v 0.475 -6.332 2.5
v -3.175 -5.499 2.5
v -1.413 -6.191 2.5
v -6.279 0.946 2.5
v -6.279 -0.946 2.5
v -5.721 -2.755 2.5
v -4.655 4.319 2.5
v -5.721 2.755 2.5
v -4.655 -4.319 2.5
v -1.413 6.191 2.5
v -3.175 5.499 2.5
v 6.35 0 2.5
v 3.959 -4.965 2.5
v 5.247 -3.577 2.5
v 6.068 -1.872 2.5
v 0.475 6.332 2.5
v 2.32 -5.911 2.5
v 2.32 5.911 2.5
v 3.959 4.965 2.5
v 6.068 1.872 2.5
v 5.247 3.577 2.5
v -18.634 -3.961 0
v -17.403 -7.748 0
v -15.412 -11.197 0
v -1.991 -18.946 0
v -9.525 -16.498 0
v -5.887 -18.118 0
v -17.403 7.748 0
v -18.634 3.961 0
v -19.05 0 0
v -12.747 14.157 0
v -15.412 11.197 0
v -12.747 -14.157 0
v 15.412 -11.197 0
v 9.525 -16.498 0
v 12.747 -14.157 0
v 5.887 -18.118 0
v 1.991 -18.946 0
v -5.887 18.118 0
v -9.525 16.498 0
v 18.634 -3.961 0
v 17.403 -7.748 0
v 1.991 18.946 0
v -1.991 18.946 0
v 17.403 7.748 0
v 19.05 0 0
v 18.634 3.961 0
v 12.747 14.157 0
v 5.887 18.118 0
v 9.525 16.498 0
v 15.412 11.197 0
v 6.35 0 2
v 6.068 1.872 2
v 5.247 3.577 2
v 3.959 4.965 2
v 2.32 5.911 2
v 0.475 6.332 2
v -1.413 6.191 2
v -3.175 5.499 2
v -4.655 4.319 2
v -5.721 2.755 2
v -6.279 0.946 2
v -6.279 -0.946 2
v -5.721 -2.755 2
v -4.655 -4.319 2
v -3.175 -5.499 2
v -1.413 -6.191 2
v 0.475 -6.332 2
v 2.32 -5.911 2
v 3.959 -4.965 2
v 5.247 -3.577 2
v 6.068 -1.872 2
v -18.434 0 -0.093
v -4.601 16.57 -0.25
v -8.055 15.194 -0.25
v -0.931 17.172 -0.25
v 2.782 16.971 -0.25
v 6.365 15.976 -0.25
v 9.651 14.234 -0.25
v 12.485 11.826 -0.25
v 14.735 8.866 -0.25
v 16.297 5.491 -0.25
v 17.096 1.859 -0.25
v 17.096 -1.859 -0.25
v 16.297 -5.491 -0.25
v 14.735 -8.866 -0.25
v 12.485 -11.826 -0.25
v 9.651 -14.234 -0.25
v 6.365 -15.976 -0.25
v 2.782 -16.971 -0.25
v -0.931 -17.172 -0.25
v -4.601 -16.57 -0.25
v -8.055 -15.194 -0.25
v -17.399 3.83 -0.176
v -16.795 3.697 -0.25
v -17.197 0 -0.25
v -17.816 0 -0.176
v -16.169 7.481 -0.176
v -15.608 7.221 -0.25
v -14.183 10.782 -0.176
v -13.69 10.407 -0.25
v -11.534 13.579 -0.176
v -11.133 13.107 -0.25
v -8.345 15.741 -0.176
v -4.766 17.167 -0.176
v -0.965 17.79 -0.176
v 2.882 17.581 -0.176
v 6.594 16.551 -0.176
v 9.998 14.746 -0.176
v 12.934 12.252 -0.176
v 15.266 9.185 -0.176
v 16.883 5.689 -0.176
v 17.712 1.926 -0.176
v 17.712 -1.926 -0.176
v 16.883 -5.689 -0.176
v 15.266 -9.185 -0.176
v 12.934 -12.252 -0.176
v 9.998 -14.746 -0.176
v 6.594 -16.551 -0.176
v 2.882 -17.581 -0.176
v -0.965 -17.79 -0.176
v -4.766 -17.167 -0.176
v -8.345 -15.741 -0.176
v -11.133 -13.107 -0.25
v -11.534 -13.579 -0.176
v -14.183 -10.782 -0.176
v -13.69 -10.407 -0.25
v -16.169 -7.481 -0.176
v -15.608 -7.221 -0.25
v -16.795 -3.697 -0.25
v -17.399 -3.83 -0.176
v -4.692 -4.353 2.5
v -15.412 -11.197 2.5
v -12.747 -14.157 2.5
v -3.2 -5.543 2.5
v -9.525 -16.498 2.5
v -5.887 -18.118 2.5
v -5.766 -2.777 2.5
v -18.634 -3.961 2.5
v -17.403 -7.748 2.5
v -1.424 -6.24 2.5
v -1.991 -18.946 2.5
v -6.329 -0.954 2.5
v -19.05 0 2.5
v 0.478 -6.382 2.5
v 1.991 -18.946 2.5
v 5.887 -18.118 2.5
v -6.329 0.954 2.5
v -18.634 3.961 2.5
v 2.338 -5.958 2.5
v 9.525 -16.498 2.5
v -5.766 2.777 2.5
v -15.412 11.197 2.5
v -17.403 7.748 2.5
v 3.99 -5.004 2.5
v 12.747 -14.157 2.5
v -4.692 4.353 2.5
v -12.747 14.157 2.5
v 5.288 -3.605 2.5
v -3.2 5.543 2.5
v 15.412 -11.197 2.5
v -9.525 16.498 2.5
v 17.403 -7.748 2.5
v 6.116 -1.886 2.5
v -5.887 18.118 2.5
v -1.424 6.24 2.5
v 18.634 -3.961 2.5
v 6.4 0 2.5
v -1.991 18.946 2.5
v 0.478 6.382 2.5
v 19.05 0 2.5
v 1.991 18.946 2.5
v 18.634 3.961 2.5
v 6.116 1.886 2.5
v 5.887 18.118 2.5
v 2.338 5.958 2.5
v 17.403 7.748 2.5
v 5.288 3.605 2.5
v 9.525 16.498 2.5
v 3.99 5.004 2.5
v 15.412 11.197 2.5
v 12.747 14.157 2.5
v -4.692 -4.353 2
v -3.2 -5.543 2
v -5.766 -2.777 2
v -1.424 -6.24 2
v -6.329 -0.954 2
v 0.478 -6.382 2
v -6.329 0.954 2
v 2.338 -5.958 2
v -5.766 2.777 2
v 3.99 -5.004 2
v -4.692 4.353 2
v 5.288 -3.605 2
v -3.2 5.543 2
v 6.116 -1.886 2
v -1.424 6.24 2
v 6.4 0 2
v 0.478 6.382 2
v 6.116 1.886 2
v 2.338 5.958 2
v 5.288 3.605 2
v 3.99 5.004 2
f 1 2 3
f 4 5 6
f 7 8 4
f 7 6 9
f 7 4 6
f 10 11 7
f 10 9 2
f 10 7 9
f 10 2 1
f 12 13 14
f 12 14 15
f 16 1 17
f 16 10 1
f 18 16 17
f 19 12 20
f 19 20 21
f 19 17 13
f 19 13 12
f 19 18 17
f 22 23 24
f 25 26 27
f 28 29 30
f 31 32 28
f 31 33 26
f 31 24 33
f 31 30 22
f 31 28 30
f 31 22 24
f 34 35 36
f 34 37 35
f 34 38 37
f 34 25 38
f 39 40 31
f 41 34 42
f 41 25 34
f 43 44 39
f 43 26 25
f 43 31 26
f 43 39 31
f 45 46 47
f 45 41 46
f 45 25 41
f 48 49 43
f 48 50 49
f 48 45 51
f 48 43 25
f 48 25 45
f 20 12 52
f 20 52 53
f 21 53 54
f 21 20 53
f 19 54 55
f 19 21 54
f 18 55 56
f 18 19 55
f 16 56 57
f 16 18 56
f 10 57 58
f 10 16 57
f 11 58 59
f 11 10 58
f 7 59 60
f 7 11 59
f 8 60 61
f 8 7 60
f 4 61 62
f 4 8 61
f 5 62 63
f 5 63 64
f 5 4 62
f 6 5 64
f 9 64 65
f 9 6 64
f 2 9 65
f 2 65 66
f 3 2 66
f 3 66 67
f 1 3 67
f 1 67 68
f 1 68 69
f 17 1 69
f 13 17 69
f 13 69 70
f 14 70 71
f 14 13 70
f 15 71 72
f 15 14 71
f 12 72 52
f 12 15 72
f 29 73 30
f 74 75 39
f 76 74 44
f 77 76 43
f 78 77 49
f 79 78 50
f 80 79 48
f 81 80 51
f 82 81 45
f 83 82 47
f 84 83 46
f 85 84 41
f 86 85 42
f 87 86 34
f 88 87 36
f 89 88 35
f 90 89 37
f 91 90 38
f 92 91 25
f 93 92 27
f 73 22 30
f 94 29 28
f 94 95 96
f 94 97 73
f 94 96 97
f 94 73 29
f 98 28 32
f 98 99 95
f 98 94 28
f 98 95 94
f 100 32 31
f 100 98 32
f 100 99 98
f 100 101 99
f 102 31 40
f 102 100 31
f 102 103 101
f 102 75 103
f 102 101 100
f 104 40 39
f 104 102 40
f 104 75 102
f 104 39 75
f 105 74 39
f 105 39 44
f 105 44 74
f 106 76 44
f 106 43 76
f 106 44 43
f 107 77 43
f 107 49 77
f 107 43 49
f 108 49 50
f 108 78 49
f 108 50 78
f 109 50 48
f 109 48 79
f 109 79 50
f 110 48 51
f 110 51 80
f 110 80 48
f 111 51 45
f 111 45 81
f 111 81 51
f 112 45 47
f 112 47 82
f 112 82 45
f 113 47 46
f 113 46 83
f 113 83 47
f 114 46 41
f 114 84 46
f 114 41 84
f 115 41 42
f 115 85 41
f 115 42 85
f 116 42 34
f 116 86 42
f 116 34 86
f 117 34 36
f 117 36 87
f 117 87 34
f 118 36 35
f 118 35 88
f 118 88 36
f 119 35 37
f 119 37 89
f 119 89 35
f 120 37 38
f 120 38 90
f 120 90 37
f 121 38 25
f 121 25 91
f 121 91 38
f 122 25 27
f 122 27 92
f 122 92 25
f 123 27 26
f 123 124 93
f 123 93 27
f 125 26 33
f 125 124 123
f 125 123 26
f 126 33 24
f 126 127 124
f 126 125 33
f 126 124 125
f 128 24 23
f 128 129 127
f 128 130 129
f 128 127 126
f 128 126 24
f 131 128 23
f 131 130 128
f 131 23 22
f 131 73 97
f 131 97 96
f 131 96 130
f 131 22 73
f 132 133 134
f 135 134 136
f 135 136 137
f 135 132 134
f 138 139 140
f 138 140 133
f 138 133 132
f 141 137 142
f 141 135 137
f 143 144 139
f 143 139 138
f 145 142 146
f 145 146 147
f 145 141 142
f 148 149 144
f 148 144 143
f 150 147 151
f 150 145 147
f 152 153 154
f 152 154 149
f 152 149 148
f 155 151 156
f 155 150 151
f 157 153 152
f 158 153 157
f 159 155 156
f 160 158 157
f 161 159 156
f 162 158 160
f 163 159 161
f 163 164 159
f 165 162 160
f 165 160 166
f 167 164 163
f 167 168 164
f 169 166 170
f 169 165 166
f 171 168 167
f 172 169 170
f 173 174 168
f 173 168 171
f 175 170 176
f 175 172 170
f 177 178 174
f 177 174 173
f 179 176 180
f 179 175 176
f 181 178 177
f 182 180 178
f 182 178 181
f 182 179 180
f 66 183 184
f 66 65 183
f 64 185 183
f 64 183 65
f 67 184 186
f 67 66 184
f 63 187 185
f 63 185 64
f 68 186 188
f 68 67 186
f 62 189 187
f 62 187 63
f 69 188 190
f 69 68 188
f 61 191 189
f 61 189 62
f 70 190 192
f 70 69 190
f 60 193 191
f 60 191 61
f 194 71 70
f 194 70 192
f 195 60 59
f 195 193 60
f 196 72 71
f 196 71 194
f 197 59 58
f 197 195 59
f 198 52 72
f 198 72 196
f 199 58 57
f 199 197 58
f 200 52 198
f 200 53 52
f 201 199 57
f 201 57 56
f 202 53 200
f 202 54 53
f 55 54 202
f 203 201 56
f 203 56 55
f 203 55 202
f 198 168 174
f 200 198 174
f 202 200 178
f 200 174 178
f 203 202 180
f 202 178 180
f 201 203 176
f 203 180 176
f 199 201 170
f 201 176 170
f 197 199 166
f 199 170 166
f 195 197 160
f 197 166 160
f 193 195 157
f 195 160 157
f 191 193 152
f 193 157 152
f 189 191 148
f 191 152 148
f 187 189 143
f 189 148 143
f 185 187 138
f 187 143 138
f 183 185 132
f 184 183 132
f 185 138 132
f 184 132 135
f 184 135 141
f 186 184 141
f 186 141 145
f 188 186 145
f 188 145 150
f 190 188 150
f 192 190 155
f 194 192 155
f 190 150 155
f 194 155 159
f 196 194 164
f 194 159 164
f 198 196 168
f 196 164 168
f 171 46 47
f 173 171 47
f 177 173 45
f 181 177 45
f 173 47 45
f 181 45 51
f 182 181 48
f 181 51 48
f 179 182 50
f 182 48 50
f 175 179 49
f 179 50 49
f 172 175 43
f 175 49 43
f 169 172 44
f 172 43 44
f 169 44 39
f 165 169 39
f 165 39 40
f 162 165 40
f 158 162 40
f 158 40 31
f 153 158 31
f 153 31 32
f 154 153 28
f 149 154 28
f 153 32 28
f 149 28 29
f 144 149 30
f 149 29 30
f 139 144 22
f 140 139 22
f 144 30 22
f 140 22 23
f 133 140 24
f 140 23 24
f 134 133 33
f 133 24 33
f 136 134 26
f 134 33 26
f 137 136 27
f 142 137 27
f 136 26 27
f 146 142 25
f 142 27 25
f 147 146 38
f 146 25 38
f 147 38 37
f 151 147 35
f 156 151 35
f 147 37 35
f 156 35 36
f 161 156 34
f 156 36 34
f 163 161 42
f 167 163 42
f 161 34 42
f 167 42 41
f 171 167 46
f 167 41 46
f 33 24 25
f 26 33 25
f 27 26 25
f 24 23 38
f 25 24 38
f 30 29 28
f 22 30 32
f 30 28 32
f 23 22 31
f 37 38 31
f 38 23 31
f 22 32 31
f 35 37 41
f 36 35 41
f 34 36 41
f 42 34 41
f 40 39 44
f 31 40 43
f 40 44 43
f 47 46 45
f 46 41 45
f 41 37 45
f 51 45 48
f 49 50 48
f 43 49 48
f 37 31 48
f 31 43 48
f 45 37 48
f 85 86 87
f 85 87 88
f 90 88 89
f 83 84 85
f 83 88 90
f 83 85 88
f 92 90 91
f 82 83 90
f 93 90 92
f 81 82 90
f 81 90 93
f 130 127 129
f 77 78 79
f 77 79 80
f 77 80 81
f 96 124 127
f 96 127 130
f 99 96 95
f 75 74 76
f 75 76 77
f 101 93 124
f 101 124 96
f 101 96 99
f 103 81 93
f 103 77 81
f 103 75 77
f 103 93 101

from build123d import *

# Parameters (mm, degrees)
F0_R     = 19.05
F1_DEPTH = 2.5
F2_R     = 6.4
F2_R_2   = 6.35
F3_DEPTH = 0.5


with BuildPart() as f1:
    # F0 (on Top) → F1 (new body)
    with BuildSketch(Plane.XY):
        Circle(F0_R)
    extrude(amount=F1_DEPTH)

    # F2 (on face) → F3 (cut)
    with BuildSketch(Plane.XY.offset(2.5)):
        Circle(F2_R)
        Circle(F2_R_2, mode=Mode.SUBTRACT)
    extrude(amount=-F3_DEPTH, mode=Mode.SUBTRACT)


with BuildPart() as f5:
    # F4 (on Front) → F5 (revolve)
    with BuildSketch(Plane.XZ):
        with BuildLine():
            Line((0, 0), (-19.05, 0))
            ThreePointArc((-19.05, 0), (-18.124981, -0.135675), (-17.197082, -0.25))
            Line((-17.197082, -0.25), (0, -0.25))
            Line((0, -0.25), (0, 0))
        make_face()
    revolve(axis=Axis((0, 0, -0.125), (0, 0, -1)))


solid = Compound([f1.part, f5.part])
